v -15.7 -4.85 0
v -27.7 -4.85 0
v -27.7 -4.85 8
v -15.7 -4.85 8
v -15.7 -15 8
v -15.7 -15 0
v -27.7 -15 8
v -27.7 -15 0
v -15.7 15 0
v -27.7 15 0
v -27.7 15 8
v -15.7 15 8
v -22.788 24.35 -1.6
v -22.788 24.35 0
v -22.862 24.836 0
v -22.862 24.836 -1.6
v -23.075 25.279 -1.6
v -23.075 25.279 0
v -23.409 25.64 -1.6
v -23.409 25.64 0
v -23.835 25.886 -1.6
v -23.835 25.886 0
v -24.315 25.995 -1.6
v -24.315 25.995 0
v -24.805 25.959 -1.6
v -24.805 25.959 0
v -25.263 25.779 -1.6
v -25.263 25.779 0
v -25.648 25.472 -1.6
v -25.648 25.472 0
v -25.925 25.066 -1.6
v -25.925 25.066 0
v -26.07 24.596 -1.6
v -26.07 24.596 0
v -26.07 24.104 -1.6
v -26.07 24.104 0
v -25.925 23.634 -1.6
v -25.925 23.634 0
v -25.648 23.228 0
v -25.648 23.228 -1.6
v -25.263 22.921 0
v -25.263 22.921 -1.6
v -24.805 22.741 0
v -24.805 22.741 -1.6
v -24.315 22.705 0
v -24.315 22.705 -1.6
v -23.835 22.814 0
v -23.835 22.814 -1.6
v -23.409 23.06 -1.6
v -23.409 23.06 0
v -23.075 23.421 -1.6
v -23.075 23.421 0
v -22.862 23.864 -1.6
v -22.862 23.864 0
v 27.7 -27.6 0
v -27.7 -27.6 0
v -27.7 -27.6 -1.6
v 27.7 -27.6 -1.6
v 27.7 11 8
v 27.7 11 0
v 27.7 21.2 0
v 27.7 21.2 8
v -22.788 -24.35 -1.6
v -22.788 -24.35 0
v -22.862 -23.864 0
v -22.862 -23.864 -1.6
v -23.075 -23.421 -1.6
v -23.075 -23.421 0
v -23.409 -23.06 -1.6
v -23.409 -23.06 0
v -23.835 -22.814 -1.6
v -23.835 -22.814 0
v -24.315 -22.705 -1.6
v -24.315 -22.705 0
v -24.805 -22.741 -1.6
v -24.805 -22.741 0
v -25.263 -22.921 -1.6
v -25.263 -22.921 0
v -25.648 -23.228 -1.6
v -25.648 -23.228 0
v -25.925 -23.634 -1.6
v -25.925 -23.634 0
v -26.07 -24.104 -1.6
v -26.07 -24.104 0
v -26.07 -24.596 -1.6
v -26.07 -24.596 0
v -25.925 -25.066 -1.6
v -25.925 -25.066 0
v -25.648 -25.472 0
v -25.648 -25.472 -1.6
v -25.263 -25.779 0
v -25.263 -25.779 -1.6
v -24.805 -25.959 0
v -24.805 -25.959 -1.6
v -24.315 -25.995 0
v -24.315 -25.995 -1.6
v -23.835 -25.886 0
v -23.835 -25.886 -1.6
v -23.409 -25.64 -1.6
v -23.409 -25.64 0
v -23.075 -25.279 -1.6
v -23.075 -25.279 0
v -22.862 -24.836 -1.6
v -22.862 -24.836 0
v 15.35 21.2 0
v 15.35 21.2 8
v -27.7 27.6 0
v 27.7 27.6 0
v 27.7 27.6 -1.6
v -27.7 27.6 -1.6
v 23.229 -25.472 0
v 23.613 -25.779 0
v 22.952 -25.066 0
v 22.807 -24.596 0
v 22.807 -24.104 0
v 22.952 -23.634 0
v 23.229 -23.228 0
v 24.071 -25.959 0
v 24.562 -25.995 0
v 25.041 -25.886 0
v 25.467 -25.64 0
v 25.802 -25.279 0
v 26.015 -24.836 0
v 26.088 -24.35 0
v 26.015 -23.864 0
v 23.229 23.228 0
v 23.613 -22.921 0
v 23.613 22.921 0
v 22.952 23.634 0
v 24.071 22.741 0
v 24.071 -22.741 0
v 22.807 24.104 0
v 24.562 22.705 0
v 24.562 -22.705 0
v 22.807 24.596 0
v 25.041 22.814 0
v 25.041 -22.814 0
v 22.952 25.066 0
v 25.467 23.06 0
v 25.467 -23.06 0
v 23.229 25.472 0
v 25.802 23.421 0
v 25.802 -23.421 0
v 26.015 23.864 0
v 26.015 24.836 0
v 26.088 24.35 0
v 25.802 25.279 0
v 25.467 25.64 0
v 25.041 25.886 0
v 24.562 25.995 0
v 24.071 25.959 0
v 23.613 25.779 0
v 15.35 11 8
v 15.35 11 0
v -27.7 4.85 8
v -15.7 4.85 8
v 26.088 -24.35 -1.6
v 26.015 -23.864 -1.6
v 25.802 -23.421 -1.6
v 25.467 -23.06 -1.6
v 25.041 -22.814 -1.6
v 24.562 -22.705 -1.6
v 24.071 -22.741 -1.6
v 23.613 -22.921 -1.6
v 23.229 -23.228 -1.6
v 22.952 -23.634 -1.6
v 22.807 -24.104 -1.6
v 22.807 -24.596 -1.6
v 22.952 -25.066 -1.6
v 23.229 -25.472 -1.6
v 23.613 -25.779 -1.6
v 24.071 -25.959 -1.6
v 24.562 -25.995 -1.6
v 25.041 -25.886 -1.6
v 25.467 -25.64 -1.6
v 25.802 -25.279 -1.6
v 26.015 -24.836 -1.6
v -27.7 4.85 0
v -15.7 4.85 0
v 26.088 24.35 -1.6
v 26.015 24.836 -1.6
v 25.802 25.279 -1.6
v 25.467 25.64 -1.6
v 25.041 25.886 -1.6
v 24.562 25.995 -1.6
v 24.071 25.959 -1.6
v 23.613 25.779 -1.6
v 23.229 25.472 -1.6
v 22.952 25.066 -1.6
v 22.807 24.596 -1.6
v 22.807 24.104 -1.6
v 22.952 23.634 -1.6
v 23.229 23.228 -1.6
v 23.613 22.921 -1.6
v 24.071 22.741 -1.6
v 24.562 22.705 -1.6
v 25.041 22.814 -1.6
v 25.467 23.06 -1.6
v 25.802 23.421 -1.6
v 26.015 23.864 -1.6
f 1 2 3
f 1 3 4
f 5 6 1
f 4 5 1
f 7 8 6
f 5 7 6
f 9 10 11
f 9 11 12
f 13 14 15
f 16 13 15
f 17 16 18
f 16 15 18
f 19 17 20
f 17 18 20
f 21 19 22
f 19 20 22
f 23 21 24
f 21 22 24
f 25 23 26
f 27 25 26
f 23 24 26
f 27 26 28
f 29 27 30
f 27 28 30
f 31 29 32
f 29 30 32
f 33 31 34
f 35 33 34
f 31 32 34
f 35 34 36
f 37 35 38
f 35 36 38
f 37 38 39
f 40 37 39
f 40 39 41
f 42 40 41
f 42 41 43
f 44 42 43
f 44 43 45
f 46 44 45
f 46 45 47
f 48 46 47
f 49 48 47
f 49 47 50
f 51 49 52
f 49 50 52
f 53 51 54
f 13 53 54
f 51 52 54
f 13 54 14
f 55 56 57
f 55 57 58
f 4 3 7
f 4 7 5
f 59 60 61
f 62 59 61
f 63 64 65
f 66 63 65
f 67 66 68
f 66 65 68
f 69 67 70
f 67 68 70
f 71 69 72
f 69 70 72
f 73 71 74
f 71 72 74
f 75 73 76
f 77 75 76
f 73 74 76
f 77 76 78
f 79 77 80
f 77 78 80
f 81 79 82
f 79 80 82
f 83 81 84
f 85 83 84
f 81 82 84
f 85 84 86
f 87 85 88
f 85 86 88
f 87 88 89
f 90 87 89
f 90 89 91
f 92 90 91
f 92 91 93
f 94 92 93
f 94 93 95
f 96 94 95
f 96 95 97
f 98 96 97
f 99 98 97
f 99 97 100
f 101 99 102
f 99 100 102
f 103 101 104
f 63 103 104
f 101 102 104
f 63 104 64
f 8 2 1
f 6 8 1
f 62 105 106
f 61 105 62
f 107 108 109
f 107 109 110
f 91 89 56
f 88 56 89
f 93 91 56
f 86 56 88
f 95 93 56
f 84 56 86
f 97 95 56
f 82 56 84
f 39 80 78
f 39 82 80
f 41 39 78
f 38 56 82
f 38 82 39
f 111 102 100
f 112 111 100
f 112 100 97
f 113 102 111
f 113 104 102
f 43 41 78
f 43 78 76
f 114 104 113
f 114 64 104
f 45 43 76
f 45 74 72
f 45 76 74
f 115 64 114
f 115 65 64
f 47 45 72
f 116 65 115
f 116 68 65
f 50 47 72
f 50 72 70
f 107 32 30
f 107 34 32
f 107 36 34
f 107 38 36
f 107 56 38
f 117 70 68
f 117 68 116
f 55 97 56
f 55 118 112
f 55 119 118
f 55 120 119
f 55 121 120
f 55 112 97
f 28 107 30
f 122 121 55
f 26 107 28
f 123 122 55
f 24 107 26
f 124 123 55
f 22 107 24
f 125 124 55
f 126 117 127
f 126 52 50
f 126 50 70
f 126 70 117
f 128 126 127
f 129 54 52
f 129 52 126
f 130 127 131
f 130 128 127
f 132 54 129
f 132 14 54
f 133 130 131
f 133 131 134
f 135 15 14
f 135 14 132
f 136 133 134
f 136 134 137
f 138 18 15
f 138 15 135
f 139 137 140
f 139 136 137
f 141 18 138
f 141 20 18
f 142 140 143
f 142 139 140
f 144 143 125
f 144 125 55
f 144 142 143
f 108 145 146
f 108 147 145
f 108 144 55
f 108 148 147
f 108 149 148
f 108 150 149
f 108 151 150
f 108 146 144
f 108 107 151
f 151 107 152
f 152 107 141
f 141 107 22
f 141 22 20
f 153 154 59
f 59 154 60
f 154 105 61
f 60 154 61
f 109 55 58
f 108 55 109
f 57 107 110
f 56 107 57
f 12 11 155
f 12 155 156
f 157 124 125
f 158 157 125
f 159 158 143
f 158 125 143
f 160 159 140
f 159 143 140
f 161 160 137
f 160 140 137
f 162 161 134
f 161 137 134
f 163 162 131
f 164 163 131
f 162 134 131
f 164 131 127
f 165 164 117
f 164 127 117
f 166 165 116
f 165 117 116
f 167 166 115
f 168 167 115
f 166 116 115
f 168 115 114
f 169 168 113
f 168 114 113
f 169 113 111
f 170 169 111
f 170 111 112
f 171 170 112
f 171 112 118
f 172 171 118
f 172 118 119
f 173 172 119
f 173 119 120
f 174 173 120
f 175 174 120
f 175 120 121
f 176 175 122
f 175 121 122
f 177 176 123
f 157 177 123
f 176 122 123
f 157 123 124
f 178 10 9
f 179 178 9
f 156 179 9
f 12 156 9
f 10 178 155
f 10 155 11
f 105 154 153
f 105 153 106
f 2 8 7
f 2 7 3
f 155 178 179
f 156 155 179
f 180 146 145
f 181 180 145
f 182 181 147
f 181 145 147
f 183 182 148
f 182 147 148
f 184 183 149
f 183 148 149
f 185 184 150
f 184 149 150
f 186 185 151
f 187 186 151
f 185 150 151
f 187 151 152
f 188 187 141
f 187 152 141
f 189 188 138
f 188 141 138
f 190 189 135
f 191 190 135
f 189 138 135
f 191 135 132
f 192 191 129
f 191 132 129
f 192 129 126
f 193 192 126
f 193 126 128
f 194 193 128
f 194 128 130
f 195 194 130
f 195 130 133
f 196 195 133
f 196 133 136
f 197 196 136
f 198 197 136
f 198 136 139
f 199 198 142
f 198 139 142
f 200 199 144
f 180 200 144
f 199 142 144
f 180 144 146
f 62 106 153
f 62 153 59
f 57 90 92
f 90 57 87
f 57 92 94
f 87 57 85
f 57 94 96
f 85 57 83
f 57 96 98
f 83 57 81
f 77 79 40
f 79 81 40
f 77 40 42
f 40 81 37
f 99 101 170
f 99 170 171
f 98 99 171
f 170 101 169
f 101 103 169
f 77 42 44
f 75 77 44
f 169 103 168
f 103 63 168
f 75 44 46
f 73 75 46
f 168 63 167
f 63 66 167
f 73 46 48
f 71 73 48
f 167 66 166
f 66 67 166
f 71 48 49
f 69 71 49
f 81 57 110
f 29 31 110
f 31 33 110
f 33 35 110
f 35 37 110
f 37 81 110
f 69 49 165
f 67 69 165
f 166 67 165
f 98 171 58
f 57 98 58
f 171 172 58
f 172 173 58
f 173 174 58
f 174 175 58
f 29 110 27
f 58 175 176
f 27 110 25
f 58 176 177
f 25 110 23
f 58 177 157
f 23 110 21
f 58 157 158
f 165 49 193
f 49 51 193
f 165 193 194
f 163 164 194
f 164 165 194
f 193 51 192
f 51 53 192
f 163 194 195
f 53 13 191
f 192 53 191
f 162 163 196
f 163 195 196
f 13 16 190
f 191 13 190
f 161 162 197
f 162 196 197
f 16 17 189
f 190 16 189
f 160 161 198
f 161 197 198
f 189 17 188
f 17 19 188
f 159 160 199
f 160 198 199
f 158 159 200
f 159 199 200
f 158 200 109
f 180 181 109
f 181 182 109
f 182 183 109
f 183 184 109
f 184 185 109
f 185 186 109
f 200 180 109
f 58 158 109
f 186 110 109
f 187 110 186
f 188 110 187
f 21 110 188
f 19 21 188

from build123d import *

# Parameters (mm, degrees)
SKETCH_1_W        = 55.4
SKETCH_1_H        = 55.2
SKETCH_1_R        = 1.65
EXTRUDE_1_DEPTH   = 1.6
SKETCH_1_3_W      = 12
SKETCH_1_3_H      = 10.15
EXTRUDE_2_DEPTH   = 8
EXTRUDE_2_2_DEPTH = 8
SKETCH_1_4_W      = 12.35
SKETCH_1_4_H      = 10.2
EXTRUDE_3_DEPTH   = 8


with BuildPart() as part:
    # 스케치1 → 보스-돌출1 (new body)
    with BuildSketch(Plane.XY):
        Rectangle(SKETCH_1_W, SKETCH_1_H)
        with Locations((-24.438224638, -24.35)):
            Circle(SKETCH_1_R, mode=Mode.SUBTRACT)
        with Locations((24.438224638, -24.35)):
            Circle(SKETCH_1_R, mode=Mode.SUBTRACT)
        with Locations((-24.438224638, 24.35)):
            Circle(SKETCH_1_R, mode=Mode.SUBTRACT)
        with Locations((24.438224638, 24.35)):
            Circle(SKETCH_1_R, mode=Mode.SUBTRACT)
    extrude(amount=-EXTRUDE_1_DEPTH)


with BuildPart() as body_2:
    # 스케치1<3> → 보스-돌출2 (new body)
    with BuildSketch(Plane.XY):
        with Locations((-21.7, -9.925)):
            Rectangle(SKETCH_1_3_W, SKETCH_1_3_H)
    extrude(amount=EXTRUDE_2_DEPTH)


with BuildPart() as body_3:
    # 스케치1<3> → Extrude 2 2 (new body)
    with BuildSketch(Plane.XY):
        with Locations((-21.7, 9.925)):
            Rectangle(SKETCH_1_3_W, SKETCH_1_3_H)
    extrude(amount=EXTRUDE_2_2_DEPTH)


with BuildPart() as body_4:
    # 스케치1<4> → 보스-돌출3 (new body)
    with BuildSketch(Plane.XY):
        with Locations((21.525, 16.1)):
            Rectangle(SKETCH_1_4_W, SKETCH_1_4_H)
    extrude(amount=EXTRUDE_3_DEPTH)


solid = Compound([part.part, body_2.part, body_3.part, body_4.part])
